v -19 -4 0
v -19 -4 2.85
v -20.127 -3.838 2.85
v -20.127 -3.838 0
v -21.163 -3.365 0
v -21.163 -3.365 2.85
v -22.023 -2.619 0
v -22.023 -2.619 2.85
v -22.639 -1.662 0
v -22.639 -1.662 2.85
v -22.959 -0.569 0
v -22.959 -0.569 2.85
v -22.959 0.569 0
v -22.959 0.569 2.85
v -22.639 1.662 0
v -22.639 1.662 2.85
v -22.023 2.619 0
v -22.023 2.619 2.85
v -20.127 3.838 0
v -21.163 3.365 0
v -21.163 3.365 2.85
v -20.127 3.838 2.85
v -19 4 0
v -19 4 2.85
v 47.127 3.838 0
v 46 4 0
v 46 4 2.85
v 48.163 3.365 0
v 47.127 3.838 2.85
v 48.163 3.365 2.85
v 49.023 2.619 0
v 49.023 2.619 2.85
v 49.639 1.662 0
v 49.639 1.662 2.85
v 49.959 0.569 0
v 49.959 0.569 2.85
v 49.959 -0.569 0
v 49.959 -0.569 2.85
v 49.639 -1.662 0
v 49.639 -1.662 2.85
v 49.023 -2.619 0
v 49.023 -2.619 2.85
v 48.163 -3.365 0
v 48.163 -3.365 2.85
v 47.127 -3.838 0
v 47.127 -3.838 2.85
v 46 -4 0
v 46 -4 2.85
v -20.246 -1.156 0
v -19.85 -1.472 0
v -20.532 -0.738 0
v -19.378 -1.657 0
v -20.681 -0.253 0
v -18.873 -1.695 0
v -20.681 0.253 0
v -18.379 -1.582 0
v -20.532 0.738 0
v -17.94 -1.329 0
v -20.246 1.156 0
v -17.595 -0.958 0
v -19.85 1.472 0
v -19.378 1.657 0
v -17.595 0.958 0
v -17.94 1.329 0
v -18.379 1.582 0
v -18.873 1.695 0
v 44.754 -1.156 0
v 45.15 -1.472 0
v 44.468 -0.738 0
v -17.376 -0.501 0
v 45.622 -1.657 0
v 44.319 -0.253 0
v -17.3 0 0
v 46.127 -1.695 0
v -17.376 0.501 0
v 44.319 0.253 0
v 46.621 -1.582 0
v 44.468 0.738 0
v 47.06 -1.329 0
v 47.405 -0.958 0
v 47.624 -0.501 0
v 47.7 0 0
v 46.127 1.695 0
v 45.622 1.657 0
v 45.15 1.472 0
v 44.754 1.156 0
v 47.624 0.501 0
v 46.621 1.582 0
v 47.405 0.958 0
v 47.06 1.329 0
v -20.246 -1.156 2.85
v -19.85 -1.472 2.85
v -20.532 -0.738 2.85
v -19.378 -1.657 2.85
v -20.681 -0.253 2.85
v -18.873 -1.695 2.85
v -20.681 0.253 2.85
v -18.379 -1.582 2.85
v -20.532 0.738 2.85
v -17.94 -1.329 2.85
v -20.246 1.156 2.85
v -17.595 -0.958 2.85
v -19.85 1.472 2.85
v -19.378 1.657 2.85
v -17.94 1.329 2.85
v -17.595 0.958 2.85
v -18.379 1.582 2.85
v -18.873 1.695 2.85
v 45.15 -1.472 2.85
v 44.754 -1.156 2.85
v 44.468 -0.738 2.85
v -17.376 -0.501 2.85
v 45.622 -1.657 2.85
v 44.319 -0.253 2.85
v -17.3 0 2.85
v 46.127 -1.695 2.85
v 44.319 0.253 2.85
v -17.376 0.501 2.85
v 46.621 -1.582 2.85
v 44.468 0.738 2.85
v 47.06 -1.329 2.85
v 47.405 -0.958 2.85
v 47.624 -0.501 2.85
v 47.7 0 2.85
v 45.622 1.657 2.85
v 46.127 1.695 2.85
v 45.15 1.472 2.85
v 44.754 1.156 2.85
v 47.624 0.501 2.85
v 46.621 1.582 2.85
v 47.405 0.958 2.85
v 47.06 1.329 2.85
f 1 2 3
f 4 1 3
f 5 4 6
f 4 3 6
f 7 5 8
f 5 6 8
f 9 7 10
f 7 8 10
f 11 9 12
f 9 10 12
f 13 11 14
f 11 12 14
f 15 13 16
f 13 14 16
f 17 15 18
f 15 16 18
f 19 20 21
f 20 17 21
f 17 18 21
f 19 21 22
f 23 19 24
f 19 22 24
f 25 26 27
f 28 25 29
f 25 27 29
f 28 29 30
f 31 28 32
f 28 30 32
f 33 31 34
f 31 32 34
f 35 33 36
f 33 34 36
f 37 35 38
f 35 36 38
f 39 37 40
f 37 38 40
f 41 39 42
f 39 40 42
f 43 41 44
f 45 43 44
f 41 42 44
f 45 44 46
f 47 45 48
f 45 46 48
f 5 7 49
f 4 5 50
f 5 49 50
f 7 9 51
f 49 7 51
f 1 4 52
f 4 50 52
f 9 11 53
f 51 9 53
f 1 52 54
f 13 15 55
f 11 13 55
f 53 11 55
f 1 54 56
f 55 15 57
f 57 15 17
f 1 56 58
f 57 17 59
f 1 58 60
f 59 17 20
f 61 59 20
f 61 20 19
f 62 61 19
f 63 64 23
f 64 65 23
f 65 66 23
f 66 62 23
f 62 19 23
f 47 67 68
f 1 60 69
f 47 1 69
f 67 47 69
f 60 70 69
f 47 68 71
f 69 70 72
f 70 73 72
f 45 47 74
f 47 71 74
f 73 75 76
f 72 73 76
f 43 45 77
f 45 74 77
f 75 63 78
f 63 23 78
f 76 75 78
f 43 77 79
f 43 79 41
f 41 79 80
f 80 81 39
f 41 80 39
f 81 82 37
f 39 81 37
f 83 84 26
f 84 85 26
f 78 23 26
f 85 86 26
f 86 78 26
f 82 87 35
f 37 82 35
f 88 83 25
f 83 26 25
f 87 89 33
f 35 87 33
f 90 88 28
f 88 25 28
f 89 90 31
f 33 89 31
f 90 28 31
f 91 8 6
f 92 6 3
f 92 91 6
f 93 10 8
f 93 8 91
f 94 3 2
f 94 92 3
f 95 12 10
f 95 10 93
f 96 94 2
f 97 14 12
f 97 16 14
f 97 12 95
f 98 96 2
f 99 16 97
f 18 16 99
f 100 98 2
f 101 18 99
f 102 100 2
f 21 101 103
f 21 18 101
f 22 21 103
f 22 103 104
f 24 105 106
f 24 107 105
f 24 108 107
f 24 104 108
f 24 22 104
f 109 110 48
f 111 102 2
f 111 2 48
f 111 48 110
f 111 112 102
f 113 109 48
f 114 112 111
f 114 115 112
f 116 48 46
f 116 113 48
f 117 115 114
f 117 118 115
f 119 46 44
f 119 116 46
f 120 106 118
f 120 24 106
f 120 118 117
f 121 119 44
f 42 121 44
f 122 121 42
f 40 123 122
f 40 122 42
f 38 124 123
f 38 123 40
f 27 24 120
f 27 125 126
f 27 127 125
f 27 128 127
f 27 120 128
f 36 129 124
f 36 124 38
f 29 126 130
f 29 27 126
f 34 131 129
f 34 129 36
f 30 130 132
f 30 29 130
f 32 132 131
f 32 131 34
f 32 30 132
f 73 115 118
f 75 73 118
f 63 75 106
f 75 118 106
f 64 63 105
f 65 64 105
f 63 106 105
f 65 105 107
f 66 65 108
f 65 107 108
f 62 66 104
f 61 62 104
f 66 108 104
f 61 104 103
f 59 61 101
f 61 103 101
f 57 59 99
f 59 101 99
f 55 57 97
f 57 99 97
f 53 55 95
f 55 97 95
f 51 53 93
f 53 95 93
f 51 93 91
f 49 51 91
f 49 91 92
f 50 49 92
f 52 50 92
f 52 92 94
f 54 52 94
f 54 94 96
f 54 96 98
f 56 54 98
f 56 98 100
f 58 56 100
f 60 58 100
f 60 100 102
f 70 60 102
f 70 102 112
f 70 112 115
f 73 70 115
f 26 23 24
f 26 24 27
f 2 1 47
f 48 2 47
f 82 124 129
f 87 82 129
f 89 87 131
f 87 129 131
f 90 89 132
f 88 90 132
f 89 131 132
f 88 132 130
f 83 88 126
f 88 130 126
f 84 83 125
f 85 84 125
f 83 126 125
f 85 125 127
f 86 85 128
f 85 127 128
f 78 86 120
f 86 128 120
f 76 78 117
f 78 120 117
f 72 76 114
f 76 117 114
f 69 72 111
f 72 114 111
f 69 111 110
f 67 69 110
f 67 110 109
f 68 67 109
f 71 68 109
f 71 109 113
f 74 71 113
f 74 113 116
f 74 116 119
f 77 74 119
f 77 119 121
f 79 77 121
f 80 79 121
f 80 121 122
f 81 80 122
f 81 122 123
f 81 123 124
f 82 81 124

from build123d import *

# Parameters (mm, degrees)
SKETCH1_W           = 100
SKETCH1_H           = 8
BOSS_EXTRUDE1_DEPTH = 2.85
CUT_EXTRUDE1_DEPTH  = 51.240645896
SKETCH3_R           = 1.7
CUT_EXTRUDE2_DEPTH  = 51.240645896
SKETCH4_R           = 1.7
CUT_EXTRUDE3_DEPTH  = 51.240645896
CUT_EXTRUDE4_DEPTH  = 51.240645896


with BuildPart() as part:
    # Sketch1 → Boss-Extrude1 (new body)
    with BuildSketch(Plane.XY):
        Rectangle(SKETCH1_W, SKETCH1_H)
    extrude(amount=BOSS_EXTRUDE1_DEPTH)

    # Sketch2 → Cut-Extrude1 (cut, through all)
    with BuildSketch(Plane.XY.offset(2.85)):
        with BuildLine():
            Line((46, -4), (51, -4))
            Line((51, -4), (51, 4))
            Line((51, 4), (46, 4))
            ThreePointArc((46, 4), (50, 0), (46, -4))
        make_face()
    cut_extrude1 = extrude(amount=-CUT_EXTRUDE1_DEPTH, mode=Mode.SUBTRACT)

    # Sketch3 → Cut-Extrude2 (cut, through all)
    with BuildSketch(Plane.XY.offset(2.85)):
        with Locations((46, 0)):
            Circle(SKETCH3_R)
    cut_extrude2 = extrude(amount=-CUT_EXTRUDE2_DEPTH, mode=Mode.SUBTRACT)

    # Mirror1: Cut-Extrude1, Cut-Extrude2 across plane
    add(cut_extrude1.mirror(Plane(origin=(0, 0, 0), x_dir=(0, 0, 1), z_dir=(1, 0, 0))), mode=Mode.SUBTRACT)
    add(cut_extrude2.mirror(Plane(origin=(0, 0, 0), x_dir=(0, 0, 1), z_dir=(1, 0, 0))), mode=Mode.SUBTRACT)

    # Sketch4 → Cut-Extrude3 (cut, through all)
    with BuildSketch(Plane.XY.offset(2.85)):
        with Locations((-19, 0)):
            Circle(SKETCH4_R)
    extrude(amount=-CUT_EXTRUDE3_DEPTH, mode=Mode.SUBTRACT)

    # Sketch5 → Cut-Extrude4 (cut, through all)
    with BuildSketch(Plane.XY.offset(2.85)):
        with BuildLine():
            Line((-19, 4), (-50, 4))
            Line((-50, 4), (-50, -4))
            Line((-50, -4), (-19, -4))
            ThreePointArc((-19, -4), (-23, 0), (-19, 4))
        make_face()
    extrude(amount=-CUT_EXTRUDE4_DEPTH, mode=Mode.SUBTRACT)


solid = part.part
